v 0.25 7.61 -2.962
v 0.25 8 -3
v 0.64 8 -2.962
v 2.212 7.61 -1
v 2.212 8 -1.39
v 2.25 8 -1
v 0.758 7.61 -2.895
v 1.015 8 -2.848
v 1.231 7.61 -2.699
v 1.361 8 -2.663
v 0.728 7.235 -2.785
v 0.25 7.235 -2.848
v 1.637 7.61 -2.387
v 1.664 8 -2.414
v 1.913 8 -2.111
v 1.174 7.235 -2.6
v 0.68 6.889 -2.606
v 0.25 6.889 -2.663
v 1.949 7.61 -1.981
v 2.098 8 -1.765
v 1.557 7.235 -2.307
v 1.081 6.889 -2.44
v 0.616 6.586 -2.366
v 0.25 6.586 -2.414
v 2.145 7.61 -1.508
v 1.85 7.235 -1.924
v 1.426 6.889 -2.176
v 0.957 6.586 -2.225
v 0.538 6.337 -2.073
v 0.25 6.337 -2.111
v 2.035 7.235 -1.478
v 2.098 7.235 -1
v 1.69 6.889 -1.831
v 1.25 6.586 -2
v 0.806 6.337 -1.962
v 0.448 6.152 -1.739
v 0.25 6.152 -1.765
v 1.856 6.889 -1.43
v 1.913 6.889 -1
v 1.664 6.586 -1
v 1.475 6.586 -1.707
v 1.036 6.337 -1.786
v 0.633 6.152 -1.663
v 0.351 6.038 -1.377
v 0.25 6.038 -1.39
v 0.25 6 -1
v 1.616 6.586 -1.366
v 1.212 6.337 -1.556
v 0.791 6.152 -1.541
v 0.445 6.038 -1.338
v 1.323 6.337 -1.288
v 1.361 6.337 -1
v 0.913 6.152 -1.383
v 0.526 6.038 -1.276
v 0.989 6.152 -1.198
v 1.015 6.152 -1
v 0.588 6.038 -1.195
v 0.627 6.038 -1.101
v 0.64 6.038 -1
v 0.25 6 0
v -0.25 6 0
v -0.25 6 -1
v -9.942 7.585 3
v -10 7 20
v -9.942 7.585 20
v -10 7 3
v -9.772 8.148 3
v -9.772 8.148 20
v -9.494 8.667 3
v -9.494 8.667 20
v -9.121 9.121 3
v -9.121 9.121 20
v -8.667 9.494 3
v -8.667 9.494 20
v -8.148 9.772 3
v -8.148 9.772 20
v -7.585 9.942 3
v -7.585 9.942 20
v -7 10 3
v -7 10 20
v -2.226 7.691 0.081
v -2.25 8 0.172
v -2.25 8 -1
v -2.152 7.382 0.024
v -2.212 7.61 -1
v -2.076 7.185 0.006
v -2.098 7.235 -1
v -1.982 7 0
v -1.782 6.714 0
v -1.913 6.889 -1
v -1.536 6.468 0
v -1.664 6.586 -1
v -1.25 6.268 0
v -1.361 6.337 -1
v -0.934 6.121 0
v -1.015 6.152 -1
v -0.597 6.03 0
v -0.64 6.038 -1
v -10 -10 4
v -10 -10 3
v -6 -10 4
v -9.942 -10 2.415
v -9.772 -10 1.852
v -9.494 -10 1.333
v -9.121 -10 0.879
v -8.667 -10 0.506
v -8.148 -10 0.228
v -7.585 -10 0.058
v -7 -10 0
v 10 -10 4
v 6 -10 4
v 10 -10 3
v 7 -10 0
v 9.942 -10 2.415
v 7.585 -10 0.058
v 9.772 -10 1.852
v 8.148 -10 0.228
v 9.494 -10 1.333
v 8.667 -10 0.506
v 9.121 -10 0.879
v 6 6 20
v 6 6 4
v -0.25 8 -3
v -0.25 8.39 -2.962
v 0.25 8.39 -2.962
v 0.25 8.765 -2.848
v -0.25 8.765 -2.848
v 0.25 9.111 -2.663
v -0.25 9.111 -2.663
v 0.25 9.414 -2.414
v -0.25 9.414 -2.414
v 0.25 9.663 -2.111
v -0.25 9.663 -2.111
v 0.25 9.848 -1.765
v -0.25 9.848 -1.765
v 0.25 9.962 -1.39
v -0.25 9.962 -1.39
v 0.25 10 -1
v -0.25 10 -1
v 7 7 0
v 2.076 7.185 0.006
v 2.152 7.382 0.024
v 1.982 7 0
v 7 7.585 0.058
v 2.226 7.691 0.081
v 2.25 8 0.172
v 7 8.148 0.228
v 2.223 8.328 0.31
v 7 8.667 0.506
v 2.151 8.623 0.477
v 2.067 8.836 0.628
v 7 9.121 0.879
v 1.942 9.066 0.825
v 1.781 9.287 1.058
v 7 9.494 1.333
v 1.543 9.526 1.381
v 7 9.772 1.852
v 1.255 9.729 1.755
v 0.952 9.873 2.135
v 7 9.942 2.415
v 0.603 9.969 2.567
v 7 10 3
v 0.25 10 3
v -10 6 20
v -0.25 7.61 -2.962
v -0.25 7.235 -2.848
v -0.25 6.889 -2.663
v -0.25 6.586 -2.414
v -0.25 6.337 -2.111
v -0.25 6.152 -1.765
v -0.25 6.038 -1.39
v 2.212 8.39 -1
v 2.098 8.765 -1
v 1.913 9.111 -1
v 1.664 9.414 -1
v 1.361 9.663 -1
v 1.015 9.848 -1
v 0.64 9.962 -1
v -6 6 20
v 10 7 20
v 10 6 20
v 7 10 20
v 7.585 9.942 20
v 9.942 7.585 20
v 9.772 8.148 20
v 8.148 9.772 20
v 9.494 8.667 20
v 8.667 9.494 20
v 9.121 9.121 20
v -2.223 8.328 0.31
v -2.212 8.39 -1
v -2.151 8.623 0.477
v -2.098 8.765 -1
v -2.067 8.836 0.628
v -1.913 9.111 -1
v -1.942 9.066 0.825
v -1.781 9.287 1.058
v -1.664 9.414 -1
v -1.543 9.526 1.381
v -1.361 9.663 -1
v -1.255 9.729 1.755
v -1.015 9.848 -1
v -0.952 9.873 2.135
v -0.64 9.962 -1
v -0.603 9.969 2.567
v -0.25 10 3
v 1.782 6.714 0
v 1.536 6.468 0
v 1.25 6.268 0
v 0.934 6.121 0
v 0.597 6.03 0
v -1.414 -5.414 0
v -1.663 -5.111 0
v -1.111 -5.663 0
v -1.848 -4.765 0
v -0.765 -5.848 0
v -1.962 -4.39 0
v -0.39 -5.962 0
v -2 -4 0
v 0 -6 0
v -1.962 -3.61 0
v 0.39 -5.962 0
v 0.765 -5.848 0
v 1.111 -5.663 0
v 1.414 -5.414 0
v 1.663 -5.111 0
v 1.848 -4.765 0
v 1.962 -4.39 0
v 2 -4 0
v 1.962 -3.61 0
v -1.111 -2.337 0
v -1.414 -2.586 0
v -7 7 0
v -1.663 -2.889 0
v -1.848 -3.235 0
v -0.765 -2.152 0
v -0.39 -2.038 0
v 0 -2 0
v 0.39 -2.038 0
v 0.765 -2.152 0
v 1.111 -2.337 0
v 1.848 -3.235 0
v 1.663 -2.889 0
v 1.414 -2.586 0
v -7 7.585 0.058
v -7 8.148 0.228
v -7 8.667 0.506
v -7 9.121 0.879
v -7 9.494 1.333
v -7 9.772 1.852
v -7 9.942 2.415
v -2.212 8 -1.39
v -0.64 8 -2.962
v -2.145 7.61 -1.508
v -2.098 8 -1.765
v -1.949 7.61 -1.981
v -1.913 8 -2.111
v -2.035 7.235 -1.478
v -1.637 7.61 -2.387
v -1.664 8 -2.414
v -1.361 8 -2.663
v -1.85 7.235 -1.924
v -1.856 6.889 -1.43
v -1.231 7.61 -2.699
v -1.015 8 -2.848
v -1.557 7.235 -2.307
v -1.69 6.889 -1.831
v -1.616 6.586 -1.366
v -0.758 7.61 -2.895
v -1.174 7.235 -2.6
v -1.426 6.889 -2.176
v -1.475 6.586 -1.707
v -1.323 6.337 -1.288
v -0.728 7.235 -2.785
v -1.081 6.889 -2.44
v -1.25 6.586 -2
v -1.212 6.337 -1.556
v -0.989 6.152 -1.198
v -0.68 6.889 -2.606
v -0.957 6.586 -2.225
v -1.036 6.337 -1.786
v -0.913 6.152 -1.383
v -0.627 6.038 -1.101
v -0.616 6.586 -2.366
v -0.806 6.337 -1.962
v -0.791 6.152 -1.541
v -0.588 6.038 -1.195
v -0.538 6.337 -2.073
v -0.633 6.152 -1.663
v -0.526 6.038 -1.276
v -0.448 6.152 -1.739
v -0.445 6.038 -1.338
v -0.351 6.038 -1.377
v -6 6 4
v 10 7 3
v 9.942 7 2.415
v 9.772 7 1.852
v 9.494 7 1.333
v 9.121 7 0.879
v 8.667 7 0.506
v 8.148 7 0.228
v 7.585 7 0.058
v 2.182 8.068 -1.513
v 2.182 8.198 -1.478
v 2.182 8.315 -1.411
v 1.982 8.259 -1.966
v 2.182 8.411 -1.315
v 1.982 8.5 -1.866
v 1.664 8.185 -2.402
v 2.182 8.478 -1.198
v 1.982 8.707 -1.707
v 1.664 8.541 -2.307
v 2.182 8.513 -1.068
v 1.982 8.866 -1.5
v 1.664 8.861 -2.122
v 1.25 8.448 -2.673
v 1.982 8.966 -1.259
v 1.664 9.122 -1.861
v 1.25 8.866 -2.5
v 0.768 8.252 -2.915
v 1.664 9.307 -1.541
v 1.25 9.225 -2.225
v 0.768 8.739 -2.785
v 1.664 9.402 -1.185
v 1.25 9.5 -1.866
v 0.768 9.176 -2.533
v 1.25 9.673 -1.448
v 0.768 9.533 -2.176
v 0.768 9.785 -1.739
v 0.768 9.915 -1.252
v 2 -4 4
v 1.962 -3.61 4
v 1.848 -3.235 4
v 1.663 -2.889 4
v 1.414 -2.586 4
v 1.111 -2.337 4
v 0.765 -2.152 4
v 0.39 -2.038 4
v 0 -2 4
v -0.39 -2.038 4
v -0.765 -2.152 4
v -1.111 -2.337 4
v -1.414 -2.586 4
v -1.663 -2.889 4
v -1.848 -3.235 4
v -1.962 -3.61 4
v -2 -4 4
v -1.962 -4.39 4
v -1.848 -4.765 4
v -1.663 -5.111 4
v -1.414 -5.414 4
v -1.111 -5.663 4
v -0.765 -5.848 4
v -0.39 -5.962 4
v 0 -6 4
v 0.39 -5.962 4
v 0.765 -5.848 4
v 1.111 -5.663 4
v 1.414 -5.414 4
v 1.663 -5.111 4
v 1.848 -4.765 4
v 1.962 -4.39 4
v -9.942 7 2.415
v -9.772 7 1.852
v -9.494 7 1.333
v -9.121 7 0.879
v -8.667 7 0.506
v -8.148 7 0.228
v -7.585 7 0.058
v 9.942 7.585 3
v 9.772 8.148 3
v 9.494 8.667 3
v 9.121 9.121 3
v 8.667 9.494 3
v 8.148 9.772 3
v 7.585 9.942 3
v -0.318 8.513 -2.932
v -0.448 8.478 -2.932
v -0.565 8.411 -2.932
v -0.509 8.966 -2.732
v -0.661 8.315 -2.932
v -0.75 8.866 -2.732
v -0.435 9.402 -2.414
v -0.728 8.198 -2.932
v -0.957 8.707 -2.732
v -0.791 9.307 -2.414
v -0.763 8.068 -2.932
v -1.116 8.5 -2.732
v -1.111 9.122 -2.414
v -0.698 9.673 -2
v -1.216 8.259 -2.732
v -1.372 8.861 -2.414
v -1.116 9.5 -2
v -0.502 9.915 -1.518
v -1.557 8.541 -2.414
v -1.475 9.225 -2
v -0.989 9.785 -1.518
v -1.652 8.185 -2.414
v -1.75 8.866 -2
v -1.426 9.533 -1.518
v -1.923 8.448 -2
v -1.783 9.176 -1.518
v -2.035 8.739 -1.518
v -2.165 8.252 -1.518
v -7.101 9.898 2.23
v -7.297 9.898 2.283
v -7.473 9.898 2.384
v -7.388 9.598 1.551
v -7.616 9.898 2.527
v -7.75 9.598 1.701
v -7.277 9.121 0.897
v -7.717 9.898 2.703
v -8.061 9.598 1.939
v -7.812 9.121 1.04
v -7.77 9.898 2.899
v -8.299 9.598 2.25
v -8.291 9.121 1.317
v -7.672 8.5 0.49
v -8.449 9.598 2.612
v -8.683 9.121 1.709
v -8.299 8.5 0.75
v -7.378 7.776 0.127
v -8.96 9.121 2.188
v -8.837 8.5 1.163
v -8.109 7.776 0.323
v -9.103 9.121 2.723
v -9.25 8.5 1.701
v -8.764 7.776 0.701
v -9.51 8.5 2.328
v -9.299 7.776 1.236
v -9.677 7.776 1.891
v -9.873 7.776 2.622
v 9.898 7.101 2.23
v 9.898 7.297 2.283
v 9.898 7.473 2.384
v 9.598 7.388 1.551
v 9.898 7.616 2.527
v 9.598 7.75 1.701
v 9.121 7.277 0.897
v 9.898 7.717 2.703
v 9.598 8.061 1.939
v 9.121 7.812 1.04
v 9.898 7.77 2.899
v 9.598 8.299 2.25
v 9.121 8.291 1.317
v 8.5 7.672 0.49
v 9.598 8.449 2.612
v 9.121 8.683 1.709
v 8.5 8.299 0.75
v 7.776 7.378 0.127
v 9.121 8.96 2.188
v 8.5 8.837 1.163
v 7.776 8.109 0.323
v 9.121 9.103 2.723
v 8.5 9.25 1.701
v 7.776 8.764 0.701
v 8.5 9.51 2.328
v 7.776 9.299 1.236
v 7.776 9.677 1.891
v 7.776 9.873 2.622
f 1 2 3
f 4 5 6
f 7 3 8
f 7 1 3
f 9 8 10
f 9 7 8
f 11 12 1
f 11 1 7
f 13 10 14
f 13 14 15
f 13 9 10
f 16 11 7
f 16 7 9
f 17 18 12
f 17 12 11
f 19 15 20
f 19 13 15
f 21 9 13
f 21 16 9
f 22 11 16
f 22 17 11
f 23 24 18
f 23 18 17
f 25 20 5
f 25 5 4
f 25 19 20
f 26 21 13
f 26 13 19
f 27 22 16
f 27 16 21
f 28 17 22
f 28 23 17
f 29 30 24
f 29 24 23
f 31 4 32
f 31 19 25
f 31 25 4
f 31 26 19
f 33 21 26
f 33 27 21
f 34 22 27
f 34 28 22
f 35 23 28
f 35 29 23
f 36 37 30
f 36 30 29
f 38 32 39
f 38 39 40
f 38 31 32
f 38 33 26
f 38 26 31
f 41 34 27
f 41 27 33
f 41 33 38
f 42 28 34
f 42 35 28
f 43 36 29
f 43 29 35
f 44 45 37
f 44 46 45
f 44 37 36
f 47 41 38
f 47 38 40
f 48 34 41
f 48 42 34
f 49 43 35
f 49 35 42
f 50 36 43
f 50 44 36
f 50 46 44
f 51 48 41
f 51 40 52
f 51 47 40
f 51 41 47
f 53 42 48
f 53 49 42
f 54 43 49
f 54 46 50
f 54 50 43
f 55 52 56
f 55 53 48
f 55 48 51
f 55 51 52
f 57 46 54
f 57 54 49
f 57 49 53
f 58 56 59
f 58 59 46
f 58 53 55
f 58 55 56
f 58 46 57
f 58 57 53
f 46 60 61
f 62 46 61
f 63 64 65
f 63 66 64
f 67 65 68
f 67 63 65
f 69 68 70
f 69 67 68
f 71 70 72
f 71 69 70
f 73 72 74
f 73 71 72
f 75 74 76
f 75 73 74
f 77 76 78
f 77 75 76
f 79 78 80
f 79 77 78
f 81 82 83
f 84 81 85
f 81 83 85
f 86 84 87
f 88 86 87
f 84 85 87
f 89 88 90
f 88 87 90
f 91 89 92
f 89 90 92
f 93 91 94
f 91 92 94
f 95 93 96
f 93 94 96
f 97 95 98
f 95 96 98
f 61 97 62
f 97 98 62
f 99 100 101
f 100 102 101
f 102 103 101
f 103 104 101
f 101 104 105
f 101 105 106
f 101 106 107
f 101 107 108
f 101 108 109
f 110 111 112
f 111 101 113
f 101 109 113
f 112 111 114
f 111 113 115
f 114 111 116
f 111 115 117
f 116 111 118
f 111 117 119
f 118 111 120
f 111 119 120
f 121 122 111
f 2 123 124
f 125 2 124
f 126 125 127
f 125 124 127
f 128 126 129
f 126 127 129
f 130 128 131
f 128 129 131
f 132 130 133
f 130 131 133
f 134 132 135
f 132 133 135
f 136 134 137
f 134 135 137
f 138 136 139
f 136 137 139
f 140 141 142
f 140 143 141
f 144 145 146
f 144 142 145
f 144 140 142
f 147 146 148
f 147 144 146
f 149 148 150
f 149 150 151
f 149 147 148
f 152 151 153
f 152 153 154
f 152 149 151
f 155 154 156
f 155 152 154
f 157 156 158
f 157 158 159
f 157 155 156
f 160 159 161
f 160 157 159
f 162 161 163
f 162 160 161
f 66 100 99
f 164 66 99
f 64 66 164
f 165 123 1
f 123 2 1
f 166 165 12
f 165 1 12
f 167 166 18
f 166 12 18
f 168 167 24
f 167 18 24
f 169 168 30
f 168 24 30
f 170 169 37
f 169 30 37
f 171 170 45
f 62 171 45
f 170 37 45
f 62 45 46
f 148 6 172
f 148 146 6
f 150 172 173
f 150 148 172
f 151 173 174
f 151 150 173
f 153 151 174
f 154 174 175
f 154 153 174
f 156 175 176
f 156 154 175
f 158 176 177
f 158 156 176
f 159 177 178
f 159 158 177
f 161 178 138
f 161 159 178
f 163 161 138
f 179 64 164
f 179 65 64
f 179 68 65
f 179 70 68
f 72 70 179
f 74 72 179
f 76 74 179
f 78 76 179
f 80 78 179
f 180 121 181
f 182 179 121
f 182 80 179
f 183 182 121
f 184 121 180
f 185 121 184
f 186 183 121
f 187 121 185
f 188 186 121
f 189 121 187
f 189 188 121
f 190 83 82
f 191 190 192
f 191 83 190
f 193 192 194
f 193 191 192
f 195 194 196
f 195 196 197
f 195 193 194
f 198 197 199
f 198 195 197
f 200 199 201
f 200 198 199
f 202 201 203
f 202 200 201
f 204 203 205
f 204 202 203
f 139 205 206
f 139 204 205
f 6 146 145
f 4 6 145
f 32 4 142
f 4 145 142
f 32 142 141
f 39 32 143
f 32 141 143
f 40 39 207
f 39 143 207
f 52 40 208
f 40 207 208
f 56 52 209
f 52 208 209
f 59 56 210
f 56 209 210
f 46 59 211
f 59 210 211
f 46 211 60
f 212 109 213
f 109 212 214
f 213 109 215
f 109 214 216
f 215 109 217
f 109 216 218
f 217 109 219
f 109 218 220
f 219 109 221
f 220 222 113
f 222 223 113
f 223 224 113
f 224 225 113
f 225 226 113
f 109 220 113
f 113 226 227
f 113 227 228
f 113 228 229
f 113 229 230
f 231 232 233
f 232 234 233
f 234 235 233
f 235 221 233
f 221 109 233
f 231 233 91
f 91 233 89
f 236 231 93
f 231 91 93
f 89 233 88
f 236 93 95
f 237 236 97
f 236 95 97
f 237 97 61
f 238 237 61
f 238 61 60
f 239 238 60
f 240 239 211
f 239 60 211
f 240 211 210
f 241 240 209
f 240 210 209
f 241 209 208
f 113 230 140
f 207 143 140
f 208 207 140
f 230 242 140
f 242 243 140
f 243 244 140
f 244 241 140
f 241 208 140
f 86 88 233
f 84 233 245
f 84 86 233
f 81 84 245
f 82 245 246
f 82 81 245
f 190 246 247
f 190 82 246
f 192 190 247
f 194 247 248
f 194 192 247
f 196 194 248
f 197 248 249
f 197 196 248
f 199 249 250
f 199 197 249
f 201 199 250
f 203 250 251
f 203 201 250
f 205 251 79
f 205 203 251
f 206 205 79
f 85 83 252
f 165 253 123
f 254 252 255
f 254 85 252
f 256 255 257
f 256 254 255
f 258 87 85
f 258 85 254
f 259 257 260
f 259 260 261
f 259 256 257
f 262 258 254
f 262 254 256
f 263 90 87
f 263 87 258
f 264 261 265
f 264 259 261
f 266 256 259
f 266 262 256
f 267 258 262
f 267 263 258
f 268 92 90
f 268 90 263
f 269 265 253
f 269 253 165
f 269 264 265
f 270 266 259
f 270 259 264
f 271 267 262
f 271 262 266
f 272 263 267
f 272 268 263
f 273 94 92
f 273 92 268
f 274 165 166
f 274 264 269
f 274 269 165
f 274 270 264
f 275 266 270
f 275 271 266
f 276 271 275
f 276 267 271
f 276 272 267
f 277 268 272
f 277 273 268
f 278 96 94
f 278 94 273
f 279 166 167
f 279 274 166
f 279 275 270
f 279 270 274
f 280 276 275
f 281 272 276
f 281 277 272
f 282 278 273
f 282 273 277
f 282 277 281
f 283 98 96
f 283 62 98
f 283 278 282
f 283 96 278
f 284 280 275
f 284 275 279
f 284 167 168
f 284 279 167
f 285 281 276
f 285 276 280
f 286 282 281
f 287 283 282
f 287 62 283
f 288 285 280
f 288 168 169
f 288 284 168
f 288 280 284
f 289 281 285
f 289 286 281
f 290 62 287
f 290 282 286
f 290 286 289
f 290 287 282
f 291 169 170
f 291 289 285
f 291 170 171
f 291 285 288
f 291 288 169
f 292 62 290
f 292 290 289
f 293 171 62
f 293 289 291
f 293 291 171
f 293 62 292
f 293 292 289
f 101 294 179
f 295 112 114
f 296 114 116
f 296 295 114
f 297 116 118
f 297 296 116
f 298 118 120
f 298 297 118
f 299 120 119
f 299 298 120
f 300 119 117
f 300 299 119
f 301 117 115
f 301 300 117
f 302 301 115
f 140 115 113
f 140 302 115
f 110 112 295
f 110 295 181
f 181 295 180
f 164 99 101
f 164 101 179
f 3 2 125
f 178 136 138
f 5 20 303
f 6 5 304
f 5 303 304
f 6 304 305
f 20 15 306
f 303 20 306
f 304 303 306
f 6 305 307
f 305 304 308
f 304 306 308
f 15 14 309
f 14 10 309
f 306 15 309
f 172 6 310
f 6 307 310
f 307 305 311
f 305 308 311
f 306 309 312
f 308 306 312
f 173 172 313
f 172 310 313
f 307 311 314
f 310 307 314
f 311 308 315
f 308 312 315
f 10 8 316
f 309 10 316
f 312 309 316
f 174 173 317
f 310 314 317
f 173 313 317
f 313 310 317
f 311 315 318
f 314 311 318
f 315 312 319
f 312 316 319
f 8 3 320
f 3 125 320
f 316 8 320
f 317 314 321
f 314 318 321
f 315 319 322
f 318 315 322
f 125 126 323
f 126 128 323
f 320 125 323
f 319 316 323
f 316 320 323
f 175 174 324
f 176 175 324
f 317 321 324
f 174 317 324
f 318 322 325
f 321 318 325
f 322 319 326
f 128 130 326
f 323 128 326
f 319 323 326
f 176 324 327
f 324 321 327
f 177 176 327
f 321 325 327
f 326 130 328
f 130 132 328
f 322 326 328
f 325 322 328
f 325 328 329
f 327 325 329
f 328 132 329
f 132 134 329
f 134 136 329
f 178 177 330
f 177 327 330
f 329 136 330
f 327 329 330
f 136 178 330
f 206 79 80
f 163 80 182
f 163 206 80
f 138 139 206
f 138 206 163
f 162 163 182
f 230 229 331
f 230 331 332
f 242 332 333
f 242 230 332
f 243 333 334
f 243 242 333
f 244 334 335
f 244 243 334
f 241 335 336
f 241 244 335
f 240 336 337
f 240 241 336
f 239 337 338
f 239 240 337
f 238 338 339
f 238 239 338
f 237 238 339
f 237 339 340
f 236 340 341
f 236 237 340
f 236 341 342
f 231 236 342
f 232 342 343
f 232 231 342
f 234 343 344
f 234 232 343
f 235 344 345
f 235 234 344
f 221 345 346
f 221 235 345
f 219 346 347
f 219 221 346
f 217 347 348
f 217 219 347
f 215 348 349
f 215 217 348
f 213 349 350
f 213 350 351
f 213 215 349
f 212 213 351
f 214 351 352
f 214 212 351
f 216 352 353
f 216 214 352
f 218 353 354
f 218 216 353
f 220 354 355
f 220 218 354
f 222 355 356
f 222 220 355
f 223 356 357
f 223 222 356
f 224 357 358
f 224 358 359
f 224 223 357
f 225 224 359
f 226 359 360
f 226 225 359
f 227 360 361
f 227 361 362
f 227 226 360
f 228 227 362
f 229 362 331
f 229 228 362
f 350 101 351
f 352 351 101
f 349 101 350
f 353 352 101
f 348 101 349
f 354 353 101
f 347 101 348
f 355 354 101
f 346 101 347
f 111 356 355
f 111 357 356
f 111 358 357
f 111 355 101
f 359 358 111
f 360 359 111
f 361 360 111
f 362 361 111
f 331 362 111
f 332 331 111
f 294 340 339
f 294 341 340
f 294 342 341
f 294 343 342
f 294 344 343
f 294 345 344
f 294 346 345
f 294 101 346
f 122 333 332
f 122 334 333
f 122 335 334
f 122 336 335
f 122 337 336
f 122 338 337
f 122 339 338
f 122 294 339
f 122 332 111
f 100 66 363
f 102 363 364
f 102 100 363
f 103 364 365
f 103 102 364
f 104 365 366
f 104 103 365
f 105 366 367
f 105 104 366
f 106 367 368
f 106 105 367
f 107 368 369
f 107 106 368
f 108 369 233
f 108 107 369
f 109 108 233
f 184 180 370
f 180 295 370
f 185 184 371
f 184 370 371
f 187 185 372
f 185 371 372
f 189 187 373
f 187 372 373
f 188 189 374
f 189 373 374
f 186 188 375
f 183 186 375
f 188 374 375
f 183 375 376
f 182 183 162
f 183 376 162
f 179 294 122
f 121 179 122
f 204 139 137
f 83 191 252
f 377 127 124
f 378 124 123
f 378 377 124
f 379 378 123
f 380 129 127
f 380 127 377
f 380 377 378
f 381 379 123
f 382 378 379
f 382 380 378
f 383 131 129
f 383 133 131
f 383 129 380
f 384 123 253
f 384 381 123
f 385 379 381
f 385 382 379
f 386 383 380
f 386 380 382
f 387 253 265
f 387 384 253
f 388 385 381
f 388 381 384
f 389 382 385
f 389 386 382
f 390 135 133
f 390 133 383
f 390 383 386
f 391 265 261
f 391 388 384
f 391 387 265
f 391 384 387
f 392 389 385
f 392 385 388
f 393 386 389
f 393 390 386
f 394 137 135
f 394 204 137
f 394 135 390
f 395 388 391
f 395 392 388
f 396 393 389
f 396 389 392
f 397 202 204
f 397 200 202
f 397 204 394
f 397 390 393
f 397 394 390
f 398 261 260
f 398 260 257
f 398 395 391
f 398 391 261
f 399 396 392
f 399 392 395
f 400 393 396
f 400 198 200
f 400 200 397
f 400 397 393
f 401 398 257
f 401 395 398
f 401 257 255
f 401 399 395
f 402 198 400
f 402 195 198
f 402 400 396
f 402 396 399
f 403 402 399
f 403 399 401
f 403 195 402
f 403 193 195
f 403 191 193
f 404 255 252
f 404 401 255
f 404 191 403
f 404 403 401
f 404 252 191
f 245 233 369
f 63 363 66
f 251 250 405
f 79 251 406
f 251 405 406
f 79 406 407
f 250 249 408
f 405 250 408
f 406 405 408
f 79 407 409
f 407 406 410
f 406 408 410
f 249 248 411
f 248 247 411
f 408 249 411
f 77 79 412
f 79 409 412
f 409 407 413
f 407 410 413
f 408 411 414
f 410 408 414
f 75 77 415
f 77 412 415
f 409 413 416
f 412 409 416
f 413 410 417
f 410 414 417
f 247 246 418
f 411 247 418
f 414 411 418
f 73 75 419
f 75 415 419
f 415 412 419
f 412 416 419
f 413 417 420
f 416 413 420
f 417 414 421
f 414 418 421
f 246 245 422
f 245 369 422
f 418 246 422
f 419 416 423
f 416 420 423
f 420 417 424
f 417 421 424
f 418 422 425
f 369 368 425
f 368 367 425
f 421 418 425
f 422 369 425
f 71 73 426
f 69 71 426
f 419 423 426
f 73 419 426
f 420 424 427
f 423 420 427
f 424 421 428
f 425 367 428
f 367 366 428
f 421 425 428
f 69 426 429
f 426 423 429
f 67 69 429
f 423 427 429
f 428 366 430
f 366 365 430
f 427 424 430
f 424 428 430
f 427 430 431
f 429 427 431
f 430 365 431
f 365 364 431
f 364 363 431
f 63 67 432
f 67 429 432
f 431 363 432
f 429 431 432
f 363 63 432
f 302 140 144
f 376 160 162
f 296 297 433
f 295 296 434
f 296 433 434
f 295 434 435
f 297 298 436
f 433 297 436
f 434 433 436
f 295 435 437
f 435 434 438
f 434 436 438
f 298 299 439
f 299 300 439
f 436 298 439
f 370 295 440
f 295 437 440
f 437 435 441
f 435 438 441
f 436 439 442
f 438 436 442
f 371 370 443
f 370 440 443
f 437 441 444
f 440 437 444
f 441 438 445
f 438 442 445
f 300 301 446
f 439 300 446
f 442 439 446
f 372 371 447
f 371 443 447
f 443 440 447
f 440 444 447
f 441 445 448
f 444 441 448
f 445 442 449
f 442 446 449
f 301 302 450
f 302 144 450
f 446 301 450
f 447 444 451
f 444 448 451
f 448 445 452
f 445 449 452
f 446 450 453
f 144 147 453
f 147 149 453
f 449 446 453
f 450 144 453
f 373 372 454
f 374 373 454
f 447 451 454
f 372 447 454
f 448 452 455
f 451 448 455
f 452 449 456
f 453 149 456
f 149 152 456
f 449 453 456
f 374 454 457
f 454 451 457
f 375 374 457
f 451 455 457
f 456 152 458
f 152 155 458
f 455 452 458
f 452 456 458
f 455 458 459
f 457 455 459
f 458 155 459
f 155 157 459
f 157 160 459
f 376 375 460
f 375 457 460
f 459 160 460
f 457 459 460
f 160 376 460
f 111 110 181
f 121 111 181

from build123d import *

# Parameters (mm, degrees)
ESQUISSE1_W        = 20
ESQUISSE1_H        = 20
ESQUISSE1_R        = 2
BOSS_EXTRU_1_DEPTH = 4
ESQUISSE2_W        = 20
ESQUISSE2_H        = 20
BOSS_EXTRU_2_DEPTH = 4
BOSS_EXTRU_3_DEPTH = 4
BOSS_EXTRU_4_DEPTH = 4
ESQUISSE5_W        = 4.5
ESQUISSE5_H        = 4
BOSS_EXTRU_5_DEPTH = 3
CONG_1_R           = 3
CONG_2_R           = 2


with BuildPart() as part:
    # Esquisse1 → Boss.-Extru.1 (new body)
    with BuildSketch(Plane.XY):
        Rectangle(ESQUISSE1_W, ESQUISSE1_H)
        with Locations((0, -4)):
            Circle(ESQUISSE1_R, mode=Mode.SUBTRACT)
    extrude(amount=BOSS_EXTRU_1_DEPTH)

    # Esquisse2 → Boss.-Extru.2 (add)
    with BuildSketch(Plane(origin=(0, 10, 0), x_dir=(1, 0, 0), z_dir=(0, 1, 0))):
        with Locations((0, -10)):
            Rectangle(ESQUISSE2_W, ESQUISSE2_H)
    extrude(amount=-BOSS_EXTRU_2_DEPTH)

    # Esquisse3 → Boss.-Extru.3 (add)
    with BuildSketch(Plane.ZY.offset(10)):
        Polygon((4, -10), (20, 6), (4, 6), align=None)
    extrude(amount=-BOSS_EXTRU_3_DEPTH)

    # Esquisse4 → Boss.-Extru.4 (add)
    with BuildSketch(Plane(origin=(10, 0, 0), x_dir=(0, 0, -1), z_dir=(1, 0, 0))):
        Polygon((-20, 6), (-4, 6), (-4, -10), align=None)
    extrude(amount=-BOSS_EXTRU_4_DEPTH)

    # Esquisse5 → Boss.-Extru.5 (add)
    with BuildSketch(Plane(origin=(0, 0, 0), x_dir=(-1, 0, 0), z_dir=(0, 0, -1))):
        with Locations((0, 8)):
            Rectangle(ESQUISSE5_W, ESQUISSE5_H)
    extrude(amount=BOSS_EXTRU_5_DEPTH)

    # Congé1
    cong_1_edges = [part.edges().sort_by_distance(p)[0] for p in [
        (6.125, 10, 0),
        (10, 0, 0),
        (-10, 0, 0),
        (-6.125, 10, 0),
        (-10, 10, 10),
        (10, 10, 10),
    ]]
    fillet(cong_1_edges, radius=CONG_1_R)

    # Congé2
    cong_2_edges = [part.edges().sort_by_distance(p)[0] for p in [
        (-2.25, 10, 0),
    ]]
    fillet(cong_2_edges, radius=CONG_2_R)
    cong_2_2_edges = [part.edges().sort_by_distance(p)[0] for p in [
        (1, 10, -3),
    ]]
    fillet(cong_2_2_edges, radius=CONG_2_R)
    cong_2_3_edges = [part.edges().sort_by_distance(p)[0] for p in [
        (2.25, 10, 1),
    ]]
    fillet(cong_2_3_edges, radius=CONG_2_R)
    cong_2_4_edges = [part.edges().sort_by_distance(p)[0] for p in [
        (-2.25, 6, -0.5),
    ]]
    fillet(cong_2_4_edges, radius=CONG_2_R - 0.0001)  # a hair under: the kernel refuses the full size


solid = part.part
